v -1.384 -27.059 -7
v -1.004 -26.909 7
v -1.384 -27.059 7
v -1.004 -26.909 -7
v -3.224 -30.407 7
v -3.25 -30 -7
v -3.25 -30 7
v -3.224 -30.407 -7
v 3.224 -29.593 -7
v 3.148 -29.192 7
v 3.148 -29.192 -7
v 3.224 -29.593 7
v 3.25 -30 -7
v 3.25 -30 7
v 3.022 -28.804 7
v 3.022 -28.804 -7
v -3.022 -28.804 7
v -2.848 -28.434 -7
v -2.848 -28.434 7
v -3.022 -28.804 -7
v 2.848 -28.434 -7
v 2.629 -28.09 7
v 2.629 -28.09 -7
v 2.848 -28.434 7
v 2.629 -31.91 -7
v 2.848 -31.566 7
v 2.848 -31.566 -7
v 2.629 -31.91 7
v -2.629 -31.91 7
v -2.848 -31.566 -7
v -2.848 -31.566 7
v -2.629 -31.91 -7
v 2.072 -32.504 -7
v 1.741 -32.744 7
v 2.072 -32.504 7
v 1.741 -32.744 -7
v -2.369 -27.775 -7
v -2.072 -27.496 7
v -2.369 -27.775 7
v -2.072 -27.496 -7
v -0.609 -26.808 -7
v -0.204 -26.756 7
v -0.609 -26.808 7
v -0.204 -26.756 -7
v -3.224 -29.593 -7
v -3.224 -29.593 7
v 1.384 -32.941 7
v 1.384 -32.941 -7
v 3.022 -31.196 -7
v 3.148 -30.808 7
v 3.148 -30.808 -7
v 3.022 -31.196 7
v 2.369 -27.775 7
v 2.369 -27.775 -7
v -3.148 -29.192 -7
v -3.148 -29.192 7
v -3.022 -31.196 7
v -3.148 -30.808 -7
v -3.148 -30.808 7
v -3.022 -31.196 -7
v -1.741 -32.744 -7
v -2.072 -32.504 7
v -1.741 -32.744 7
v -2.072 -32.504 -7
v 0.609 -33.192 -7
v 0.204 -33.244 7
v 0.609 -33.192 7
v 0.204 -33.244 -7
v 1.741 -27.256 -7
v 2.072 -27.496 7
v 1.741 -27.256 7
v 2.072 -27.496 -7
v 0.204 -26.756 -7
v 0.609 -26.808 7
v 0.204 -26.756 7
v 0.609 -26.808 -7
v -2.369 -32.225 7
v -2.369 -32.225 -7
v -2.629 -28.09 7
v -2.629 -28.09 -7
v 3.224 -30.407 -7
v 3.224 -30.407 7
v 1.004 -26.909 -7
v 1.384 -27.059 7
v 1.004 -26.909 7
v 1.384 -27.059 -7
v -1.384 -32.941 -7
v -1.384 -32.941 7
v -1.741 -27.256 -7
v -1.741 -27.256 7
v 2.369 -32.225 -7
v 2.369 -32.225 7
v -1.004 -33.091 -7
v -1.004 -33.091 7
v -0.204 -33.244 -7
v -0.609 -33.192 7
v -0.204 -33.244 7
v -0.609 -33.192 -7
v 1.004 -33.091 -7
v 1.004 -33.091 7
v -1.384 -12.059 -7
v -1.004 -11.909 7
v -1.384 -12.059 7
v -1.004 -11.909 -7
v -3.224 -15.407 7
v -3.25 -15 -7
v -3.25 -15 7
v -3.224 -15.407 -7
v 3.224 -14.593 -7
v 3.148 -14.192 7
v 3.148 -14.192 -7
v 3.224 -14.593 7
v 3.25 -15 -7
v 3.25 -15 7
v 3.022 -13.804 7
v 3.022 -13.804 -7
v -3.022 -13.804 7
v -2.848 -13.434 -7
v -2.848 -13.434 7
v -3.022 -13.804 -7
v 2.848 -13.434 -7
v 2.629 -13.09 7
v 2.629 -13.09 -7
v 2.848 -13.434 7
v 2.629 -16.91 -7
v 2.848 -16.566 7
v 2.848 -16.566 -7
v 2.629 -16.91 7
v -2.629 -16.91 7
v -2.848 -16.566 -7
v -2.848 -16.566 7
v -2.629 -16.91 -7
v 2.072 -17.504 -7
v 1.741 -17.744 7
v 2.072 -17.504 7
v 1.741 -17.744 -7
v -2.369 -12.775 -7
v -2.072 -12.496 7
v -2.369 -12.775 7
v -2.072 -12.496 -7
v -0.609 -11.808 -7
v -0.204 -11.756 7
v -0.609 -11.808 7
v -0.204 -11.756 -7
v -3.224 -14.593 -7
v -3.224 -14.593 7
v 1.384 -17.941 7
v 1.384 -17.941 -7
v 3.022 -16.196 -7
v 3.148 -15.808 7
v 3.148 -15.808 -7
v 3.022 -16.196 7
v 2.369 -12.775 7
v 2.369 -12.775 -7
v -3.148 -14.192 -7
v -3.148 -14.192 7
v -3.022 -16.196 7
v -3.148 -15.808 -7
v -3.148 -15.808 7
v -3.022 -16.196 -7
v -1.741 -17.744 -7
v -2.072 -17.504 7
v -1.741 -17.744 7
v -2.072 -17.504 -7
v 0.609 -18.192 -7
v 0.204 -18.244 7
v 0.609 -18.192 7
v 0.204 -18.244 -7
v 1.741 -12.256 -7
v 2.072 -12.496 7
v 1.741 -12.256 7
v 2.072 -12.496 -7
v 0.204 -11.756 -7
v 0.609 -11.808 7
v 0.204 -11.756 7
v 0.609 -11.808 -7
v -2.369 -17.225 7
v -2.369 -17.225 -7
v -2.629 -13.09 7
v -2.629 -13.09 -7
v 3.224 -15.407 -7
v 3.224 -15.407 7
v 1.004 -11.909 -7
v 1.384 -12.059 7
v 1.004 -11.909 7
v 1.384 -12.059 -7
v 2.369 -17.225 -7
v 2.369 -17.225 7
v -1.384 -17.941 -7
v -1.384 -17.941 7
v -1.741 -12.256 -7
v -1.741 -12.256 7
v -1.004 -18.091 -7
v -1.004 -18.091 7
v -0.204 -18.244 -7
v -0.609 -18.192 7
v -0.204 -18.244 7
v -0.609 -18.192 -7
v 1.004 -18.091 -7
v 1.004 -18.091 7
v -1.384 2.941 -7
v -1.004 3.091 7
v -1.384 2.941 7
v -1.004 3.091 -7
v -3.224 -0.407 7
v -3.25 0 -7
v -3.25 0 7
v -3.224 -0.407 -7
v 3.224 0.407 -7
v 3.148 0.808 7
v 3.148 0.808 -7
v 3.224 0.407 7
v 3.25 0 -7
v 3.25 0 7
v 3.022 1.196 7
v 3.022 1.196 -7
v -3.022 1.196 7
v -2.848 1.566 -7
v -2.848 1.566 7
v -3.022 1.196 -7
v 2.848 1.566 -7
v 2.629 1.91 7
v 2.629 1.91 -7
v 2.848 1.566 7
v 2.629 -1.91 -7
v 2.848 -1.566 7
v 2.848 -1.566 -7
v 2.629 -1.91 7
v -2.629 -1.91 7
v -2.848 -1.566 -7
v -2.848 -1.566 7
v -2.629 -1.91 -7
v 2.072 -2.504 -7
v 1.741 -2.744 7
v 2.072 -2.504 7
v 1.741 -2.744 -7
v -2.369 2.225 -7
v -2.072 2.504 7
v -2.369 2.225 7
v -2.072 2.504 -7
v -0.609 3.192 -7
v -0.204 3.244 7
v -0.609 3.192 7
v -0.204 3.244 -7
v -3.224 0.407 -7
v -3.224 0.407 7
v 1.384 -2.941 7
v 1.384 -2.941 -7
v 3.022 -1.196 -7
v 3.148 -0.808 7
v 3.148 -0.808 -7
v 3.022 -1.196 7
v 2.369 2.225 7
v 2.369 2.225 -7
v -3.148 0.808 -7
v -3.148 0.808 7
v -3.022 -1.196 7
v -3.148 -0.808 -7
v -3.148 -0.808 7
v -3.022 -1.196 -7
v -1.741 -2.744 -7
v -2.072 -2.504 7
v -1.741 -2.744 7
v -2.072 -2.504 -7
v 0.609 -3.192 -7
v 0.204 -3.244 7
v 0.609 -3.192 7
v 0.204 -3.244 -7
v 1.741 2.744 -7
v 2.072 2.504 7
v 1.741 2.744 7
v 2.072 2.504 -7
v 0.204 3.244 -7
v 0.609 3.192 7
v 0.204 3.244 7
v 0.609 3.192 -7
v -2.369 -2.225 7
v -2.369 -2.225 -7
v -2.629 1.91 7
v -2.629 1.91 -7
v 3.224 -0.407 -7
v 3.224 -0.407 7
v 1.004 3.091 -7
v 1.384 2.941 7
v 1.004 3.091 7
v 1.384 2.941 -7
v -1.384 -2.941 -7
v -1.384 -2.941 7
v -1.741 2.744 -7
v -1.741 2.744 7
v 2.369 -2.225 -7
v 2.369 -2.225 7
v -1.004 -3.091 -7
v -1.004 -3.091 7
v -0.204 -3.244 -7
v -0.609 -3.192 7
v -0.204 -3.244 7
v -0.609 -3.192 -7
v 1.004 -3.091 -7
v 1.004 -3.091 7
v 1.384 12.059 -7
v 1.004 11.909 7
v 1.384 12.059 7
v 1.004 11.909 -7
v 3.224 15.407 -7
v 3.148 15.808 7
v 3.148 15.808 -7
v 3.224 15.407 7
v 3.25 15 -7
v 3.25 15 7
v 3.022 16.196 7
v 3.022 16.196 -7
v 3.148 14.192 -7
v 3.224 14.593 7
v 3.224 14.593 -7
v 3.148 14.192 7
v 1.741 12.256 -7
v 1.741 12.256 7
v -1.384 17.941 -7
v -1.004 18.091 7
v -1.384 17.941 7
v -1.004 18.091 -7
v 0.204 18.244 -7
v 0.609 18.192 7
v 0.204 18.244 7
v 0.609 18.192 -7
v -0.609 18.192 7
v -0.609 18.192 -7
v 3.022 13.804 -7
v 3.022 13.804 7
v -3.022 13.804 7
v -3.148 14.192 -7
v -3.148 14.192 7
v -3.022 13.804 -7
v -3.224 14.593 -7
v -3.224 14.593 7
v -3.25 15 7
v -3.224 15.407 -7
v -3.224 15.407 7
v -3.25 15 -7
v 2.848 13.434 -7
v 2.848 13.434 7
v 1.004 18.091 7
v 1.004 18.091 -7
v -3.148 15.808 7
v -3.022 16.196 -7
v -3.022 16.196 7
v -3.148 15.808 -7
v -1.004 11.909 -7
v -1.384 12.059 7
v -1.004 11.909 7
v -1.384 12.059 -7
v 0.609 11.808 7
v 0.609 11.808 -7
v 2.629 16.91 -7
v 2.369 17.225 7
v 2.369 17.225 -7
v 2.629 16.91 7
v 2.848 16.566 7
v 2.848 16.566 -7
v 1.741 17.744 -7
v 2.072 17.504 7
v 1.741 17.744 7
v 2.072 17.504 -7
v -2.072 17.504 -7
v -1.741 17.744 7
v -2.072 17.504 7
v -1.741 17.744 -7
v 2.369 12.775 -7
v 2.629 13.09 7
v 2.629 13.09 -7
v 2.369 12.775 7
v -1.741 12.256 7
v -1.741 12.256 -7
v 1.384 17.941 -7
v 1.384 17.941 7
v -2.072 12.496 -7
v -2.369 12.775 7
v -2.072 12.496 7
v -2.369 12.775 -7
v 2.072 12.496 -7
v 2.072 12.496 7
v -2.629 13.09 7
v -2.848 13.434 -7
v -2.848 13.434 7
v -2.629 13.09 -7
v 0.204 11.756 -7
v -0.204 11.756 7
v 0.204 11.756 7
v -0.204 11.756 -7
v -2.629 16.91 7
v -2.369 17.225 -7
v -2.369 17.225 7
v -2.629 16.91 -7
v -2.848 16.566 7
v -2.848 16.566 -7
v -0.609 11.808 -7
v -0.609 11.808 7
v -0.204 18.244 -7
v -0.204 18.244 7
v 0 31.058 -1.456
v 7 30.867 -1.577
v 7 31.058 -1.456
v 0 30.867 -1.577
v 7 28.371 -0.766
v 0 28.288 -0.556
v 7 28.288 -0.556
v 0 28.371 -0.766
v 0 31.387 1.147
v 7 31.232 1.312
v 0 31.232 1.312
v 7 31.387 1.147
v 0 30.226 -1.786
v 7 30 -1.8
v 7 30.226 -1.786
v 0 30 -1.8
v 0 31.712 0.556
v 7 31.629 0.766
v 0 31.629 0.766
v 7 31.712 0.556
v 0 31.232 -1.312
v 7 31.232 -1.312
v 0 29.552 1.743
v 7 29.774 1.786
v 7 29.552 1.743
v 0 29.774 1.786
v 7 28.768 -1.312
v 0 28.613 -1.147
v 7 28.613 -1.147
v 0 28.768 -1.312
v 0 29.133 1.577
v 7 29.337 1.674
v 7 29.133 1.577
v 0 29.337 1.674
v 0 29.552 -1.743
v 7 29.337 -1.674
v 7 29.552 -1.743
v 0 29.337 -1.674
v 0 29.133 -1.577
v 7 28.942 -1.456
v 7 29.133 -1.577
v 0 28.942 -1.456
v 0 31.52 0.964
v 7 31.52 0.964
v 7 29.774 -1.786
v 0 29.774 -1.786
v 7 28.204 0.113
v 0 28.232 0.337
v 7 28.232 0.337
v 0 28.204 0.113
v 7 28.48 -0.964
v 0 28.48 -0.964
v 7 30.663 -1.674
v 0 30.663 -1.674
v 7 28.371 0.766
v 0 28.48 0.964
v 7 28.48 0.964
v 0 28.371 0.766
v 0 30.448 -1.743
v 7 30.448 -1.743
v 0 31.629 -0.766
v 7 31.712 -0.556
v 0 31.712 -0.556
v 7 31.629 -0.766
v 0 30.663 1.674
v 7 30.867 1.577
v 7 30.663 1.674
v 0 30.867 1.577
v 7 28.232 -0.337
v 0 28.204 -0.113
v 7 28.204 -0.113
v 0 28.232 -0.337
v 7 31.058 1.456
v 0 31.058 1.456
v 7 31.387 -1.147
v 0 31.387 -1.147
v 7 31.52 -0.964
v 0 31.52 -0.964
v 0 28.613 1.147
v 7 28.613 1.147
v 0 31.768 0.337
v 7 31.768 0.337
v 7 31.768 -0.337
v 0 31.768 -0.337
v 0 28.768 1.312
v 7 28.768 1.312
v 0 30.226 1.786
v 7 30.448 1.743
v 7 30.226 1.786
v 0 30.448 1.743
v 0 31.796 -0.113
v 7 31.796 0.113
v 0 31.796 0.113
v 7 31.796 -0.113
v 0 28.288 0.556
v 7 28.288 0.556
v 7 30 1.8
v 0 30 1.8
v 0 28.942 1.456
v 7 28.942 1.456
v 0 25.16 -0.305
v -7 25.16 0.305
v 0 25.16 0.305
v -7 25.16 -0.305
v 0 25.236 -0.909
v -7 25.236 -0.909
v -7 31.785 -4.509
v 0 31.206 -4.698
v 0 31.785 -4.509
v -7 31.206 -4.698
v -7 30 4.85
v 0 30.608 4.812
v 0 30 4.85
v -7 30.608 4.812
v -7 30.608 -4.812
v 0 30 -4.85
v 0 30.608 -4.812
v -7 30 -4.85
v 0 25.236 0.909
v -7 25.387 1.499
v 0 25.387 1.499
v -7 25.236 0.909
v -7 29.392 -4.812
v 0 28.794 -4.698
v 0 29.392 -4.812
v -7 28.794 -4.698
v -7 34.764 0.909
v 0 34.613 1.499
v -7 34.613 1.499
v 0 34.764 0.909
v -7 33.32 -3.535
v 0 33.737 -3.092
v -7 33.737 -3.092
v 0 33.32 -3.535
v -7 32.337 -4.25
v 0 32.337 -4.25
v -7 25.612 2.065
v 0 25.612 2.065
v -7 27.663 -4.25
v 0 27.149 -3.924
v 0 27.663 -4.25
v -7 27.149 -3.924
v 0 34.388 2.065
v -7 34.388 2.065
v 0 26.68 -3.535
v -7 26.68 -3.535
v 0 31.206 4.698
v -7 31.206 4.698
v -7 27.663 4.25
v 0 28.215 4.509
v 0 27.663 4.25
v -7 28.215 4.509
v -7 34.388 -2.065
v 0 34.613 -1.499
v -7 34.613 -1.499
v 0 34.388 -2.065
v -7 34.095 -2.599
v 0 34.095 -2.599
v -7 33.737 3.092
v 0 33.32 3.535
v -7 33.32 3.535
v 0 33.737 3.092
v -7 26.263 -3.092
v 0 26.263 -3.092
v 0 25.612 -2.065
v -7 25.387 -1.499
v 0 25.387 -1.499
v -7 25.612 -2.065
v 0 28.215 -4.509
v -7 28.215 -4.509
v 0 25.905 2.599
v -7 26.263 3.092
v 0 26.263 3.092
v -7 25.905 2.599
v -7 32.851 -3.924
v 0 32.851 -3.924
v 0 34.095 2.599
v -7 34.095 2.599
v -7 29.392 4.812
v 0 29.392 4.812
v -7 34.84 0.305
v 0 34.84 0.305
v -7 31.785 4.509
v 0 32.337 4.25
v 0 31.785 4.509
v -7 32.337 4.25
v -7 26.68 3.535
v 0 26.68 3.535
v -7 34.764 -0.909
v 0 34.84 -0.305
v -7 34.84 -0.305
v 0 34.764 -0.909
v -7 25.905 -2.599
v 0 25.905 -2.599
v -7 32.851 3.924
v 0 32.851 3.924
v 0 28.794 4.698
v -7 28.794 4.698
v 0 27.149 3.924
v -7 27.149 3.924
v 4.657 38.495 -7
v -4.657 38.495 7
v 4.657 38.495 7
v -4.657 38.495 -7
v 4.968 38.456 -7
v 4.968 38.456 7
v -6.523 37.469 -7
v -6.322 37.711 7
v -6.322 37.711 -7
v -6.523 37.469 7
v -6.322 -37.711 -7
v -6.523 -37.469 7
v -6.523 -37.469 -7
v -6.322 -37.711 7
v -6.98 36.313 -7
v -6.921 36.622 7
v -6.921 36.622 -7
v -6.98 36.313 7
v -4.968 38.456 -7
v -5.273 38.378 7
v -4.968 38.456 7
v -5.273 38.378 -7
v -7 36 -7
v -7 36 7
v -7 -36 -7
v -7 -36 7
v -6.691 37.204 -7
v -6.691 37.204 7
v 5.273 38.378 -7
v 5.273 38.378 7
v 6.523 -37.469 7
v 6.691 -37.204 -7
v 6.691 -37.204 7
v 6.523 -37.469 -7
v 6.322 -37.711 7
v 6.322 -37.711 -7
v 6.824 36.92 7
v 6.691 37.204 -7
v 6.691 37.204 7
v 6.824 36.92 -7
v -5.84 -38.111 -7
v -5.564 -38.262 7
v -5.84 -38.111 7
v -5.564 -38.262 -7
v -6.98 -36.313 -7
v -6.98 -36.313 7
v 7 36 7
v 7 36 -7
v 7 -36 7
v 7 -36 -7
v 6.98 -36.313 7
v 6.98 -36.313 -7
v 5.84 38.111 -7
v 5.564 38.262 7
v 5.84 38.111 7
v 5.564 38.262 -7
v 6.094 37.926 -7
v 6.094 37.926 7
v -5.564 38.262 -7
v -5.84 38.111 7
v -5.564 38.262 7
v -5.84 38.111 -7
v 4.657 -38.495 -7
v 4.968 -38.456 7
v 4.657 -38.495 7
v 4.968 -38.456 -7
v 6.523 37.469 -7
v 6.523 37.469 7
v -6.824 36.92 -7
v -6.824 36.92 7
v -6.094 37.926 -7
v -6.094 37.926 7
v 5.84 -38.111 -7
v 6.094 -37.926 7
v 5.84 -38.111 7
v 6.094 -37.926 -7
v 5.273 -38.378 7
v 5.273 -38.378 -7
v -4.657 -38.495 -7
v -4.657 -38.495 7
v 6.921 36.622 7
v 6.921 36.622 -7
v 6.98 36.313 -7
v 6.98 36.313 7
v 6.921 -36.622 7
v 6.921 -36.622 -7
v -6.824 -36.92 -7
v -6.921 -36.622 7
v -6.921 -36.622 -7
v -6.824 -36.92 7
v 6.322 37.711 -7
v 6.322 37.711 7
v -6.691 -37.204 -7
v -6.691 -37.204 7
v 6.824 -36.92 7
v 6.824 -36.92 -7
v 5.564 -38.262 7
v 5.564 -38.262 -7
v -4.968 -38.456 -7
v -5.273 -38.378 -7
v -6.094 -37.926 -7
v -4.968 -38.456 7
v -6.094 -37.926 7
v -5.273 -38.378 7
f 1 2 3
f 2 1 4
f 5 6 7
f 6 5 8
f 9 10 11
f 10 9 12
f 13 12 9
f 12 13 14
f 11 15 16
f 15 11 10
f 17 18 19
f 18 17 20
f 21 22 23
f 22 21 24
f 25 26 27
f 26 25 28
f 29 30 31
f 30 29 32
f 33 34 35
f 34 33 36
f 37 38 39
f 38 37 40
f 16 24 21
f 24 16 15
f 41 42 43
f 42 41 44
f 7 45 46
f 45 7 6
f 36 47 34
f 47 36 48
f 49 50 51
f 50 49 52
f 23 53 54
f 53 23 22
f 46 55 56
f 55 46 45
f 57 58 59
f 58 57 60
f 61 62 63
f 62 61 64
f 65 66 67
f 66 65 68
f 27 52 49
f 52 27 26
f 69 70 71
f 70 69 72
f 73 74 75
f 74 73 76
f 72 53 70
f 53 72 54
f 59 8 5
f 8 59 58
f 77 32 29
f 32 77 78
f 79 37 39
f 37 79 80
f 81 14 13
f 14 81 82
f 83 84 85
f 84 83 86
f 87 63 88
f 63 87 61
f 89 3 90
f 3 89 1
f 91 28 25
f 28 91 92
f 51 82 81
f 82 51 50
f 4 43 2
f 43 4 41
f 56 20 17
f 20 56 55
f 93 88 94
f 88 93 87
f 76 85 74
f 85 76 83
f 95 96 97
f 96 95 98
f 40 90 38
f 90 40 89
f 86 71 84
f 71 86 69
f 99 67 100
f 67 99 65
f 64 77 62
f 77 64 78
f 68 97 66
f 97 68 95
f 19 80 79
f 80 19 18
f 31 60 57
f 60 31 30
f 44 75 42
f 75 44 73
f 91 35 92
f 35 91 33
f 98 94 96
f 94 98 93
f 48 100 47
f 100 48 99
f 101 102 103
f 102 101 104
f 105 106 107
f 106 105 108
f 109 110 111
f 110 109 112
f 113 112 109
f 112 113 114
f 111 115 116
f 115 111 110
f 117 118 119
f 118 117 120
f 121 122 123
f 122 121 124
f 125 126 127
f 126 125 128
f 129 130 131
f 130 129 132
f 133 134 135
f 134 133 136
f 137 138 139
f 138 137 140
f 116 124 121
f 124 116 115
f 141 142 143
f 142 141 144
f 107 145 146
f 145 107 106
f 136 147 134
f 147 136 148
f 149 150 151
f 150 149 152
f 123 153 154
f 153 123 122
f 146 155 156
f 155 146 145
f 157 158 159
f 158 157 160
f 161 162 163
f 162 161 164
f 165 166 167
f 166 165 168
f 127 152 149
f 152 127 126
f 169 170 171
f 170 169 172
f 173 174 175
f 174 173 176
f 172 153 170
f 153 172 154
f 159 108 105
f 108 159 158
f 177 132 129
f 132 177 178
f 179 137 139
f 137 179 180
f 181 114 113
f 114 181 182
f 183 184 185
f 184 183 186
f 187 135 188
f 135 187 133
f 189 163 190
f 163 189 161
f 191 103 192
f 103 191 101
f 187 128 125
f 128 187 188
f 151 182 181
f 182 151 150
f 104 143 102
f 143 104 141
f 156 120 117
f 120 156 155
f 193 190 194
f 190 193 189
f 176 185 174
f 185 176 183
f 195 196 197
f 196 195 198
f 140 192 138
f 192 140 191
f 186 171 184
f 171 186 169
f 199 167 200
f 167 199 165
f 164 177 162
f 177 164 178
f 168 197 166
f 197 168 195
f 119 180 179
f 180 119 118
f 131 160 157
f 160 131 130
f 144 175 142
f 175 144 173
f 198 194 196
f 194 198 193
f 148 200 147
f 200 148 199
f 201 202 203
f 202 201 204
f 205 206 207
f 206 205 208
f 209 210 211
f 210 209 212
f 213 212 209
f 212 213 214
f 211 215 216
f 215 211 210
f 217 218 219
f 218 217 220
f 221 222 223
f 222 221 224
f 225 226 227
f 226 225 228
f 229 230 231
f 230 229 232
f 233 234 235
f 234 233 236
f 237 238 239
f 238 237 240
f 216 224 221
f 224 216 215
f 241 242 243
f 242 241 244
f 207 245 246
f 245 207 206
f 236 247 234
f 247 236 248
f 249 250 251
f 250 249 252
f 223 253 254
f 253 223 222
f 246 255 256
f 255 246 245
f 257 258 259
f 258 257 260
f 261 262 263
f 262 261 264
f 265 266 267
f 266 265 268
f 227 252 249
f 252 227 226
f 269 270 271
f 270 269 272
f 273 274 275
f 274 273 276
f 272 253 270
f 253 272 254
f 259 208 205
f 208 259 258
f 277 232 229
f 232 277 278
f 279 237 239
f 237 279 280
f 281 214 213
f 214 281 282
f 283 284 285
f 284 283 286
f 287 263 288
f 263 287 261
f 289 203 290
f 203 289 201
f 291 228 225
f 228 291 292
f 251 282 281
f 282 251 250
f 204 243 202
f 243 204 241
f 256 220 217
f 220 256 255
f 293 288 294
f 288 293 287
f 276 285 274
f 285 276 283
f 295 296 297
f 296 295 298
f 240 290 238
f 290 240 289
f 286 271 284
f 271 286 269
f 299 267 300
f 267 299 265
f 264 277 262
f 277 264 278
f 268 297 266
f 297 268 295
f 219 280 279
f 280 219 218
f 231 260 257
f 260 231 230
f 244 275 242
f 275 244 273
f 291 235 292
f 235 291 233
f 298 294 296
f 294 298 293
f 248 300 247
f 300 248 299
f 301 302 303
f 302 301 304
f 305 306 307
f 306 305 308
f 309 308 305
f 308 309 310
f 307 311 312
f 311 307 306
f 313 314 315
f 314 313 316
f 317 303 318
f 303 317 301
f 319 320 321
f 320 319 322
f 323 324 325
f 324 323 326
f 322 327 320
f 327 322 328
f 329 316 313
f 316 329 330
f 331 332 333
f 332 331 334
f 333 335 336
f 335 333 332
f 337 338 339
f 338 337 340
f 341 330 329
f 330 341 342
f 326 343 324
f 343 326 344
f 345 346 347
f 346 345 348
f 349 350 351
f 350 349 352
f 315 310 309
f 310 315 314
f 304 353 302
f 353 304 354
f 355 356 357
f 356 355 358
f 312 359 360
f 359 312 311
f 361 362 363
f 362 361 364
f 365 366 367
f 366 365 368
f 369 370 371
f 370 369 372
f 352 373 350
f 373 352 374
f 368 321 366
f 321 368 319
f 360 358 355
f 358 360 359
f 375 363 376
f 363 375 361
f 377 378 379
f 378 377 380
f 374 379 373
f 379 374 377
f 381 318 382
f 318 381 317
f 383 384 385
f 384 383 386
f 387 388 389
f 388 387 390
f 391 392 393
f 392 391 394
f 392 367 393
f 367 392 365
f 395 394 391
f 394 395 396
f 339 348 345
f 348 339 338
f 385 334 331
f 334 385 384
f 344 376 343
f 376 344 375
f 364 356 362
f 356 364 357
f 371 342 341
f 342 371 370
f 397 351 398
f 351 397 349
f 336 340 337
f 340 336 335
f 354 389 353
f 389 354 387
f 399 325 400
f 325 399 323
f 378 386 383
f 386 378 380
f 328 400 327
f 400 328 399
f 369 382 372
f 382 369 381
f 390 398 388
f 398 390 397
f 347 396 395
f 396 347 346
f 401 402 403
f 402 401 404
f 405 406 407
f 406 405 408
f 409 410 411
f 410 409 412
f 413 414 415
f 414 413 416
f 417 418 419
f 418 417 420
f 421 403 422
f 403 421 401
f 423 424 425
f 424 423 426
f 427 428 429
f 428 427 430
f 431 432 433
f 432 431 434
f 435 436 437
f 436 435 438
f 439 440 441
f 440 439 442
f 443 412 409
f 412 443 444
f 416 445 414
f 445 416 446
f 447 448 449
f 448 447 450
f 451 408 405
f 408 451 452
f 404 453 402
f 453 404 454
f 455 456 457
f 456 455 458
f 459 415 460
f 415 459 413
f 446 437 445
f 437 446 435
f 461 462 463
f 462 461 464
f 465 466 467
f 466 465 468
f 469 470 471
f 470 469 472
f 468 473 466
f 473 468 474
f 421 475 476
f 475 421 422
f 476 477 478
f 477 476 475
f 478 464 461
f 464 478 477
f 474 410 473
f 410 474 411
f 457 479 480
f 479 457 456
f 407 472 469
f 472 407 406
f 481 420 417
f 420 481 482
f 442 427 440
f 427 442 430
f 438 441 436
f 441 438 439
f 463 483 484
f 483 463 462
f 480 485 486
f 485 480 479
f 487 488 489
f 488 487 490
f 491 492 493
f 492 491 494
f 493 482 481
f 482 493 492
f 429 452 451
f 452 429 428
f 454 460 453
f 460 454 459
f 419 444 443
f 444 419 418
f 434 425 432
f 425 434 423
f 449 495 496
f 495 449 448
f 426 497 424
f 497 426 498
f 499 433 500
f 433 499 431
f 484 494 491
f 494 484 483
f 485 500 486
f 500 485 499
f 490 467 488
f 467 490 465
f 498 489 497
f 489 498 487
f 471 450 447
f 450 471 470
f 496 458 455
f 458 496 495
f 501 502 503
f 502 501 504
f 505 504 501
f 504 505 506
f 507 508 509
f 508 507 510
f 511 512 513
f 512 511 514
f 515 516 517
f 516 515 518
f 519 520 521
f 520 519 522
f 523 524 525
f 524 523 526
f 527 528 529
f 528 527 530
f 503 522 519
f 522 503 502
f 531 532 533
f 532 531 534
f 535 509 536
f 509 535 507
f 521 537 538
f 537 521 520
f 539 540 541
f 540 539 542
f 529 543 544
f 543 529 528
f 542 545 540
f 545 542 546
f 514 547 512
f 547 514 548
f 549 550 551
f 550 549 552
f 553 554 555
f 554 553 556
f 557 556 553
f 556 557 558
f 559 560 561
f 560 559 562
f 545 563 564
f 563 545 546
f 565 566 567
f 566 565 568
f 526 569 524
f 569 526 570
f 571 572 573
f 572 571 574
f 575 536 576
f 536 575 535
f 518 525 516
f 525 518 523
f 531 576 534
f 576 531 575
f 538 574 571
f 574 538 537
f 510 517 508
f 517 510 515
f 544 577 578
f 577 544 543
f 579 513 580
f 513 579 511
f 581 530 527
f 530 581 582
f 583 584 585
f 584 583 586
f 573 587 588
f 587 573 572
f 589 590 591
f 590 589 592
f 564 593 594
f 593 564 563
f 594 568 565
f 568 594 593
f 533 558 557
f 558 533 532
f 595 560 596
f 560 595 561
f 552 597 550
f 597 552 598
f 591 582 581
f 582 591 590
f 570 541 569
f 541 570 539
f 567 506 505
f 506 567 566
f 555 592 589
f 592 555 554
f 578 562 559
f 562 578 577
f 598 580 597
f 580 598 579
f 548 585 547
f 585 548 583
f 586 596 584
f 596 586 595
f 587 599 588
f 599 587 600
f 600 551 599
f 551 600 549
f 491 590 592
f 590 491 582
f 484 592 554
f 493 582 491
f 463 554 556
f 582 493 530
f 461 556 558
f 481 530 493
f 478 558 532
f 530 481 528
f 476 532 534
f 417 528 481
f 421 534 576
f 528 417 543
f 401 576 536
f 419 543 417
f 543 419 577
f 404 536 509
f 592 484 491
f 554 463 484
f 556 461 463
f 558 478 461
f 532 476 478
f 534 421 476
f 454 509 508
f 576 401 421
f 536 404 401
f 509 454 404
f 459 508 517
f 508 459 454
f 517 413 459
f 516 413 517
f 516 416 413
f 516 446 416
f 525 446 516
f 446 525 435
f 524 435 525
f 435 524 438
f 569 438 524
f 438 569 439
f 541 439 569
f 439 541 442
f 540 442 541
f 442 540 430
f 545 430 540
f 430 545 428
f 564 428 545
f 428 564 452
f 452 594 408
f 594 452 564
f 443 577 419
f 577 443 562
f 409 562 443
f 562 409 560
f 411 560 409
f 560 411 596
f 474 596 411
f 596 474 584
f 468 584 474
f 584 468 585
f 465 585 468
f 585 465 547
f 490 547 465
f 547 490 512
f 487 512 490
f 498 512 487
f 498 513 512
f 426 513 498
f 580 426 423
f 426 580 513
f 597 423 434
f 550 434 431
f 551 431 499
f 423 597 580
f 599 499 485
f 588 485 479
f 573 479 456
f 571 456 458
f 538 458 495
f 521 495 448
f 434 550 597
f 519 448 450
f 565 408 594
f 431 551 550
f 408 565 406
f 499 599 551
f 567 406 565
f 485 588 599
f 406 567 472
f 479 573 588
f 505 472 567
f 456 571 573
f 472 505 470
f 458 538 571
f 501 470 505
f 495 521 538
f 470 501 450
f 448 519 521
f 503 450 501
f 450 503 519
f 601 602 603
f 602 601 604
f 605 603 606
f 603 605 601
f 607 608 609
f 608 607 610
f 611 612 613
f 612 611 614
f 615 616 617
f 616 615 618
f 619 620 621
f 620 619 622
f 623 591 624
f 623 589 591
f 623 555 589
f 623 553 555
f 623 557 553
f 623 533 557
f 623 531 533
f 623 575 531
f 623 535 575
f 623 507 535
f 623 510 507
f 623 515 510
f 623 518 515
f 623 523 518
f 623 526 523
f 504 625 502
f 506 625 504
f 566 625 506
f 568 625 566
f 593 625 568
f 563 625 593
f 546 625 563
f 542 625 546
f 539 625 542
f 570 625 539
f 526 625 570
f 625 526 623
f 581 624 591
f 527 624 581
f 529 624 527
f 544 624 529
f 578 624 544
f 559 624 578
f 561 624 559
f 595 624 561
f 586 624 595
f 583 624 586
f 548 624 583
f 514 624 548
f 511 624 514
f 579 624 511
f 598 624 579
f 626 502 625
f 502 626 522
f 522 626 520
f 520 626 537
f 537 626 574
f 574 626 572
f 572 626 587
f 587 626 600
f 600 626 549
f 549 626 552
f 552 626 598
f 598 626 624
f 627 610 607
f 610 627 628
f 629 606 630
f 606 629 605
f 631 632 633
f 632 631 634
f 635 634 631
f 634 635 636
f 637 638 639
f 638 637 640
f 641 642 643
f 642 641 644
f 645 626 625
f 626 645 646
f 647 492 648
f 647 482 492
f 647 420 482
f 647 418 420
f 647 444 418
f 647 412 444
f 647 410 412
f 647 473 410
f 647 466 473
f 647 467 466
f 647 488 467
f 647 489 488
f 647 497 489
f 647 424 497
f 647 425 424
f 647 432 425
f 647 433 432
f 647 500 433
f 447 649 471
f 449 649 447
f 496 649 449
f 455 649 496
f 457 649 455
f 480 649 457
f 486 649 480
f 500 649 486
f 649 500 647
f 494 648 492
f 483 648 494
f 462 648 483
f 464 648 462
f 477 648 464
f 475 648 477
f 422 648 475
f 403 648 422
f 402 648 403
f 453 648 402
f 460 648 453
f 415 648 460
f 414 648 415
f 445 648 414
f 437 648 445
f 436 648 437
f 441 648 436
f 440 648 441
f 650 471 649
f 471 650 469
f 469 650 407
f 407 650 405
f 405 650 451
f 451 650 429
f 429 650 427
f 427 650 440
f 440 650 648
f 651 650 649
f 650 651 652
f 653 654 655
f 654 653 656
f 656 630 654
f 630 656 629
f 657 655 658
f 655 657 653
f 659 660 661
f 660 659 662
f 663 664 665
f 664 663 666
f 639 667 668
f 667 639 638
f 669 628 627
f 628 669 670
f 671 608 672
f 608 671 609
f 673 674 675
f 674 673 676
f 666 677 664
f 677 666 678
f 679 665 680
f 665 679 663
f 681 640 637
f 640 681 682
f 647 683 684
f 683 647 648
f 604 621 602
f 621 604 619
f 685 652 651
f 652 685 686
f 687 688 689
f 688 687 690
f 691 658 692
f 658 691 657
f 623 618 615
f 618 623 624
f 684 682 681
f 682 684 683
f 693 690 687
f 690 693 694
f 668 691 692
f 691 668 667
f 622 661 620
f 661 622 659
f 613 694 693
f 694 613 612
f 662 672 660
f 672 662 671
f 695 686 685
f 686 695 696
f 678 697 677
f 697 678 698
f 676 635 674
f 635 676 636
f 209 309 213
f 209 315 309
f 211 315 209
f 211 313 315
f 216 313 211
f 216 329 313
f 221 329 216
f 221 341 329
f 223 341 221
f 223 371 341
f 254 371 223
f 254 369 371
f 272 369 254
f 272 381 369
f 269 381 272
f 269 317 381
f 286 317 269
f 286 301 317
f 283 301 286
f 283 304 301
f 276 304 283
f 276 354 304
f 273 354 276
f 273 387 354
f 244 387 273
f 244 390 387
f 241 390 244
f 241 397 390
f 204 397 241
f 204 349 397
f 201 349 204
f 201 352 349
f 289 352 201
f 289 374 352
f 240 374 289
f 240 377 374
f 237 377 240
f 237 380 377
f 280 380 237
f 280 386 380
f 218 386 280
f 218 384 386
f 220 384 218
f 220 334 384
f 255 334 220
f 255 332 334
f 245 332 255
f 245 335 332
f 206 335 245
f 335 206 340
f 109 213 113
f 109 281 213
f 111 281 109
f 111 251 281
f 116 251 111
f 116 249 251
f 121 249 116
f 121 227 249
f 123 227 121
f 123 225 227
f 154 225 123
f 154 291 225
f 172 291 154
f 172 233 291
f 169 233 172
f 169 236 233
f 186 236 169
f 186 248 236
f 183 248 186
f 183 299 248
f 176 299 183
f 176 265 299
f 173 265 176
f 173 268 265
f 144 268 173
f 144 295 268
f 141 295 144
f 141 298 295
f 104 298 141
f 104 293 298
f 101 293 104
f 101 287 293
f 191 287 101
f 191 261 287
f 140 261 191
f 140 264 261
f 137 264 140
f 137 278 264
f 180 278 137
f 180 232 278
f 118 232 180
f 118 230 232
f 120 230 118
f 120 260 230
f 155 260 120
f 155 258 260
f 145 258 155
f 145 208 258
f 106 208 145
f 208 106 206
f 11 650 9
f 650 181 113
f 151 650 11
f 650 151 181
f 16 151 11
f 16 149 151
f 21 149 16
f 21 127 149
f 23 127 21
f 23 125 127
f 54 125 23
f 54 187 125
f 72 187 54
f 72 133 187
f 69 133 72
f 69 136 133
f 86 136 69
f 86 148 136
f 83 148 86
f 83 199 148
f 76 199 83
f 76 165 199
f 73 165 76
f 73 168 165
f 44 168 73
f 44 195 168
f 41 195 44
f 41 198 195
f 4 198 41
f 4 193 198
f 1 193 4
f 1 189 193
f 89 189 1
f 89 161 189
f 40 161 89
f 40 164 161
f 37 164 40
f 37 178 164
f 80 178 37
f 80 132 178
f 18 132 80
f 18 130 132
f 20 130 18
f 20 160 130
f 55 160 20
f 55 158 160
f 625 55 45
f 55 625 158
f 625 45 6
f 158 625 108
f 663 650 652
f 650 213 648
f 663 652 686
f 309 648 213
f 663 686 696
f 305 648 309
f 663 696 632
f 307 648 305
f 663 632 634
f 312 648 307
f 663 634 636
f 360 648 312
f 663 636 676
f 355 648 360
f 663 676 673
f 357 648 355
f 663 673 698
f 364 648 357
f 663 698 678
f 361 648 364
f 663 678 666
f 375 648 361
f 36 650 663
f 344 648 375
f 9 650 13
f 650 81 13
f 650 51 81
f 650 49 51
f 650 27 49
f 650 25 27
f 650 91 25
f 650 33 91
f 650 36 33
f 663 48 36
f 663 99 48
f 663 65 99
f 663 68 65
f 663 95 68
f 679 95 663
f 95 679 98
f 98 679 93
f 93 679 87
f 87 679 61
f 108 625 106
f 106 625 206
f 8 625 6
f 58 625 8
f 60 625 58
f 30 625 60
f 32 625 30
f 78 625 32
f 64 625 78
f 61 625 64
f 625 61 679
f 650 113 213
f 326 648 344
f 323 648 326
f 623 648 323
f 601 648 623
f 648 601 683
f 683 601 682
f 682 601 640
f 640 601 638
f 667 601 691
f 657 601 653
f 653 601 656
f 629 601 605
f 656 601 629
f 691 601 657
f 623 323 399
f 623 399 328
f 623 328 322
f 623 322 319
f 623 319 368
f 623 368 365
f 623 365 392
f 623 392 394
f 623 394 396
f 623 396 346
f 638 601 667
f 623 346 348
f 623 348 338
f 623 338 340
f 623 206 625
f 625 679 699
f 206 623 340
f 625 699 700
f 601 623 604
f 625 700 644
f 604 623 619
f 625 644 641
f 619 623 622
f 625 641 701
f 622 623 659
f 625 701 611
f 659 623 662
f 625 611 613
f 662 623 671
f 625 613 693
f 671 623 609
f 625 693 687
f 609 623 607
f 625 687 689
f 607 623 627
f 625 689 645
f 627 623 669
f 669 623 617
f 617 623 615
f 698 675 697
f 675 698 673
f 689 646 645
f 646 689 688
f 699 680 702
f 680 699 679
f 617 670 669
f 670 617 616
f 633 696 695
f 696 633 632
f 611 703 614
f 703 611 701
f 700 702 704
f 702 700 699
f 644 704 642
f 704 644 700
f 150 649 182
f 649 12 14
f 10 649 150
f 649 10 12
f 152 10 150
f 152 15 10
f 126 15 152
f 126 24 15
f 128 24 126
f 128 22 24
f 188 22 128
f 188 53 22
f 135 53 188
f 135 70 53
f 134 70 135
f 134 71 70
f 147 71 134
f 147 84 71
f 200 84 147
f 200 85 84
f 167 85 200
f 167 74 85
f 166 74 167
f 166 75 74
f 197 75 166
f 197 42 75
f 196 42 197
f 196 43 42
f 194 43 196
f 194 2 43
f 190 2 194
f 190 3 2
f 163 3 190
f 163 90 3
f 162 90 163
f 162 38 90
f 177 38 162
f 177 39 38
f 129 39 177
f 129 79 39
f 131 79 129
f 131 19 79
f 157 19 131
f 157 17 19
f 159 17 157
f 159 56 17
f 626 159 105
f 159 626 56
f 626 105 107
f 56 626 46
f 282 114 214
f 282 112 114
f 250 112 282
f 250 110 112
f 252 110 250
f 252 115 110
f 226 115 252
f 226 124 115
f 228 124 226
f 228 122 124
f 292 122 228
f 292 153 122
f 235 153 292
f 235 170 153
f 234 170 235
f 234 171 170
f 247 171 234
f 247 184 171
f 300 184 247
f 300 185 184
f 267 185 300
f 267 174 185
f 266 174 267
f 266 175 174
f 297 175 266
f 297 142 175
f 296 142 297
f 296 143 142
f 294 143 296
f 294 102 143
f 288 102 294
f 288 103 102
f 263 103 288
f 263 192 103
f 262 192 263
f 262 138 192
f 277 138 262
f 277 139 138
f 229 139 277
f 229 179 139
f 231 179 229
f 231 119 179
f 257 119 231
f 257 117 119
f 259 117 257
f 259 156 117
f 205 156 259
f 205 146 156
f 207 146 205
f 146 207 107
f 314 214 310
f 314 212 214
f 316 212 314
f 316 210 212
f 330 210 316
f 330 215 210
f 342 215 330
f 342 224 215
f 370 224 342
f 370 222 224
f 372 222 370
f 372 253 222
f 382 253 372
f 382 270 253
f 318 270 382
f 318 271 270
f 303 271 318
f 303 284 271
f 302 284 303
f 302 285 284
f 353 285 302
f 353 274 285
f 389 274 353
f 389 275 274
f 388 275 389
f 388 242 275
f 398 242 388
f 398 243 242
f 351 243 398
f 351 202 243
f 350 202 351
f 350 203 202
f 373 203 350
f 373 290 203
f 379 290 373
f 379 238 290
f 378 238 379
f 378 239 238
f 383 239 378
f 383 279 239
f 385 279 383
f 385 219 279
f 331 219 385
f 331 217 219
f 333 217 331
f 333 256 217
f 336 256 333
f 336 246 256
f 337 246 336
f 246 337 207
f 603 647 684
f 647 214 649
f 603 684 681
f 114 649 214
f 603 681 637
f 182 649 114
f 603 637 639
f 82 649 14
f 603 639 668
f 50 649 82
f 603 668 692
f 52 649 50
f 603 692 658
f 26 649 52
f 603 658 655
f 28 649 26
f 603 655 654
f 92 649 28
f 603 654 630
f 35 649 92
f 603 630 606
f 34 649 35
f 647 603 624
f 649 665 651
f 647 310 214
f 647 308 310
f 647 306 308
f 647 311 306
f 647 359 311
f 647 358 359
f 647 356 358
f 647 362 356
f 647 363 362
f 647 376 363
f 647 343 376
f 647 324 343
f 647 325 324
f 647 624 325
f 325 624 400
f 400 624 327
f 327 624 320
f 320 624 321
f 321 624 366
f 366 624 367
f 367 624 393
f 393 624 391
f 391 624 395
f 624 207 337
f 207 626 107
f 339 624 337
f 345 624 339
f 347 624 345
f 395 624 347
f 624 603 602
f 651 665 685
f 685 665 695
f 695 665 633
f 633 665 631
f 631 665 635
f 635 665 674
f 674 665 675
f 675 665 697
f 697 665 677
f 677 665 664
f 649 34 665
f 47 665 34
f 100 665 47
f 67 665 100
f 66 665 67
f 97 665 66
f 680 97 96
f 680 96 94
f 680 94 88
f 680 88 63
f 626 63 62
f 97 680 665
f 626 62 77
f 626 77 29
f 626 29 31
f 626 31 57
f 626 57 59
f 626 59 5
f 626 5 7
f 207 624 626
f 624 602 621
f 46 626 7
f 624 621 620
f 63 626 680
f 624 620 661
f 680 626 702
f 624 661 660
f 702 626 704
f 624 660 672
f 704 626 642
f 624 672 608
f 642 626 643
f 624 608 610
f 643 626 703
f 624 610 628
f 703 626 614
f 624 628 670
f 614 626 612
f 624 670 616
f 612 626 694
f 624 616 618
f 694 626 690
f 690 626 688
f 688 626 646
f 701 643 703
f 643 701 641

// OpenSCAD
$fn = 50;


difference() {
	union() {
		translate(v = [0, 0, -7.0000000000]) {
			hull() {
				translate(v = [-4.5000000000, 36.0000000000, 0]) {
					cylinder(h = 14, r = 2.5000000000);
				}
				translate(v = [4.5000000000, 36.0000000000, 0]) {
					cylinder(h = 14, r = 2.5000000000);
				}
				translate(v = [-4.5000000000, -36.0000000000, 0]) {
					cylinder(h = 14, r = 2.5000000000);
				}
				translate(v = [4.5000000000, -36.0000000000, 0]) {
					cylinder(h = 14, r = 2.5000000000);
				}
			}
		}
	}
	union() {
		translate(v = [0.0000000000, -30.0000000000, -50.0000000000]) {
			cylinder(h = 100, r = 3.2500000000);
		}
		translate(v = [0.0000000000, -15.0000000000, -50.0000000000]) {
			cylinder(h = 100, r = 3.2500000000);
		}
		translate(v = [0.0000000000, 0.0000000000, -50.0000000000]) {
			cylinder(h = 100, r = 3.2500000000);
		}
		translate(v = [0.0000000000, 15.0000000000, -50.0000000000]) {
			cylinder(h = 100, r = 3.2500000000);
		}
		translate(v = [-50, 30, 0]) {
			rotate(a = [0, 90, 0]) {
				cylinder(h = 100, r = 1.8000000000);
			}
		}
		translate(v = [-100, 30, 0]) {
			rotate(a = [0, 90, 0]) {
				cylinder(h = 100, r = 4.8500000000);
			}
		}
	}
}
